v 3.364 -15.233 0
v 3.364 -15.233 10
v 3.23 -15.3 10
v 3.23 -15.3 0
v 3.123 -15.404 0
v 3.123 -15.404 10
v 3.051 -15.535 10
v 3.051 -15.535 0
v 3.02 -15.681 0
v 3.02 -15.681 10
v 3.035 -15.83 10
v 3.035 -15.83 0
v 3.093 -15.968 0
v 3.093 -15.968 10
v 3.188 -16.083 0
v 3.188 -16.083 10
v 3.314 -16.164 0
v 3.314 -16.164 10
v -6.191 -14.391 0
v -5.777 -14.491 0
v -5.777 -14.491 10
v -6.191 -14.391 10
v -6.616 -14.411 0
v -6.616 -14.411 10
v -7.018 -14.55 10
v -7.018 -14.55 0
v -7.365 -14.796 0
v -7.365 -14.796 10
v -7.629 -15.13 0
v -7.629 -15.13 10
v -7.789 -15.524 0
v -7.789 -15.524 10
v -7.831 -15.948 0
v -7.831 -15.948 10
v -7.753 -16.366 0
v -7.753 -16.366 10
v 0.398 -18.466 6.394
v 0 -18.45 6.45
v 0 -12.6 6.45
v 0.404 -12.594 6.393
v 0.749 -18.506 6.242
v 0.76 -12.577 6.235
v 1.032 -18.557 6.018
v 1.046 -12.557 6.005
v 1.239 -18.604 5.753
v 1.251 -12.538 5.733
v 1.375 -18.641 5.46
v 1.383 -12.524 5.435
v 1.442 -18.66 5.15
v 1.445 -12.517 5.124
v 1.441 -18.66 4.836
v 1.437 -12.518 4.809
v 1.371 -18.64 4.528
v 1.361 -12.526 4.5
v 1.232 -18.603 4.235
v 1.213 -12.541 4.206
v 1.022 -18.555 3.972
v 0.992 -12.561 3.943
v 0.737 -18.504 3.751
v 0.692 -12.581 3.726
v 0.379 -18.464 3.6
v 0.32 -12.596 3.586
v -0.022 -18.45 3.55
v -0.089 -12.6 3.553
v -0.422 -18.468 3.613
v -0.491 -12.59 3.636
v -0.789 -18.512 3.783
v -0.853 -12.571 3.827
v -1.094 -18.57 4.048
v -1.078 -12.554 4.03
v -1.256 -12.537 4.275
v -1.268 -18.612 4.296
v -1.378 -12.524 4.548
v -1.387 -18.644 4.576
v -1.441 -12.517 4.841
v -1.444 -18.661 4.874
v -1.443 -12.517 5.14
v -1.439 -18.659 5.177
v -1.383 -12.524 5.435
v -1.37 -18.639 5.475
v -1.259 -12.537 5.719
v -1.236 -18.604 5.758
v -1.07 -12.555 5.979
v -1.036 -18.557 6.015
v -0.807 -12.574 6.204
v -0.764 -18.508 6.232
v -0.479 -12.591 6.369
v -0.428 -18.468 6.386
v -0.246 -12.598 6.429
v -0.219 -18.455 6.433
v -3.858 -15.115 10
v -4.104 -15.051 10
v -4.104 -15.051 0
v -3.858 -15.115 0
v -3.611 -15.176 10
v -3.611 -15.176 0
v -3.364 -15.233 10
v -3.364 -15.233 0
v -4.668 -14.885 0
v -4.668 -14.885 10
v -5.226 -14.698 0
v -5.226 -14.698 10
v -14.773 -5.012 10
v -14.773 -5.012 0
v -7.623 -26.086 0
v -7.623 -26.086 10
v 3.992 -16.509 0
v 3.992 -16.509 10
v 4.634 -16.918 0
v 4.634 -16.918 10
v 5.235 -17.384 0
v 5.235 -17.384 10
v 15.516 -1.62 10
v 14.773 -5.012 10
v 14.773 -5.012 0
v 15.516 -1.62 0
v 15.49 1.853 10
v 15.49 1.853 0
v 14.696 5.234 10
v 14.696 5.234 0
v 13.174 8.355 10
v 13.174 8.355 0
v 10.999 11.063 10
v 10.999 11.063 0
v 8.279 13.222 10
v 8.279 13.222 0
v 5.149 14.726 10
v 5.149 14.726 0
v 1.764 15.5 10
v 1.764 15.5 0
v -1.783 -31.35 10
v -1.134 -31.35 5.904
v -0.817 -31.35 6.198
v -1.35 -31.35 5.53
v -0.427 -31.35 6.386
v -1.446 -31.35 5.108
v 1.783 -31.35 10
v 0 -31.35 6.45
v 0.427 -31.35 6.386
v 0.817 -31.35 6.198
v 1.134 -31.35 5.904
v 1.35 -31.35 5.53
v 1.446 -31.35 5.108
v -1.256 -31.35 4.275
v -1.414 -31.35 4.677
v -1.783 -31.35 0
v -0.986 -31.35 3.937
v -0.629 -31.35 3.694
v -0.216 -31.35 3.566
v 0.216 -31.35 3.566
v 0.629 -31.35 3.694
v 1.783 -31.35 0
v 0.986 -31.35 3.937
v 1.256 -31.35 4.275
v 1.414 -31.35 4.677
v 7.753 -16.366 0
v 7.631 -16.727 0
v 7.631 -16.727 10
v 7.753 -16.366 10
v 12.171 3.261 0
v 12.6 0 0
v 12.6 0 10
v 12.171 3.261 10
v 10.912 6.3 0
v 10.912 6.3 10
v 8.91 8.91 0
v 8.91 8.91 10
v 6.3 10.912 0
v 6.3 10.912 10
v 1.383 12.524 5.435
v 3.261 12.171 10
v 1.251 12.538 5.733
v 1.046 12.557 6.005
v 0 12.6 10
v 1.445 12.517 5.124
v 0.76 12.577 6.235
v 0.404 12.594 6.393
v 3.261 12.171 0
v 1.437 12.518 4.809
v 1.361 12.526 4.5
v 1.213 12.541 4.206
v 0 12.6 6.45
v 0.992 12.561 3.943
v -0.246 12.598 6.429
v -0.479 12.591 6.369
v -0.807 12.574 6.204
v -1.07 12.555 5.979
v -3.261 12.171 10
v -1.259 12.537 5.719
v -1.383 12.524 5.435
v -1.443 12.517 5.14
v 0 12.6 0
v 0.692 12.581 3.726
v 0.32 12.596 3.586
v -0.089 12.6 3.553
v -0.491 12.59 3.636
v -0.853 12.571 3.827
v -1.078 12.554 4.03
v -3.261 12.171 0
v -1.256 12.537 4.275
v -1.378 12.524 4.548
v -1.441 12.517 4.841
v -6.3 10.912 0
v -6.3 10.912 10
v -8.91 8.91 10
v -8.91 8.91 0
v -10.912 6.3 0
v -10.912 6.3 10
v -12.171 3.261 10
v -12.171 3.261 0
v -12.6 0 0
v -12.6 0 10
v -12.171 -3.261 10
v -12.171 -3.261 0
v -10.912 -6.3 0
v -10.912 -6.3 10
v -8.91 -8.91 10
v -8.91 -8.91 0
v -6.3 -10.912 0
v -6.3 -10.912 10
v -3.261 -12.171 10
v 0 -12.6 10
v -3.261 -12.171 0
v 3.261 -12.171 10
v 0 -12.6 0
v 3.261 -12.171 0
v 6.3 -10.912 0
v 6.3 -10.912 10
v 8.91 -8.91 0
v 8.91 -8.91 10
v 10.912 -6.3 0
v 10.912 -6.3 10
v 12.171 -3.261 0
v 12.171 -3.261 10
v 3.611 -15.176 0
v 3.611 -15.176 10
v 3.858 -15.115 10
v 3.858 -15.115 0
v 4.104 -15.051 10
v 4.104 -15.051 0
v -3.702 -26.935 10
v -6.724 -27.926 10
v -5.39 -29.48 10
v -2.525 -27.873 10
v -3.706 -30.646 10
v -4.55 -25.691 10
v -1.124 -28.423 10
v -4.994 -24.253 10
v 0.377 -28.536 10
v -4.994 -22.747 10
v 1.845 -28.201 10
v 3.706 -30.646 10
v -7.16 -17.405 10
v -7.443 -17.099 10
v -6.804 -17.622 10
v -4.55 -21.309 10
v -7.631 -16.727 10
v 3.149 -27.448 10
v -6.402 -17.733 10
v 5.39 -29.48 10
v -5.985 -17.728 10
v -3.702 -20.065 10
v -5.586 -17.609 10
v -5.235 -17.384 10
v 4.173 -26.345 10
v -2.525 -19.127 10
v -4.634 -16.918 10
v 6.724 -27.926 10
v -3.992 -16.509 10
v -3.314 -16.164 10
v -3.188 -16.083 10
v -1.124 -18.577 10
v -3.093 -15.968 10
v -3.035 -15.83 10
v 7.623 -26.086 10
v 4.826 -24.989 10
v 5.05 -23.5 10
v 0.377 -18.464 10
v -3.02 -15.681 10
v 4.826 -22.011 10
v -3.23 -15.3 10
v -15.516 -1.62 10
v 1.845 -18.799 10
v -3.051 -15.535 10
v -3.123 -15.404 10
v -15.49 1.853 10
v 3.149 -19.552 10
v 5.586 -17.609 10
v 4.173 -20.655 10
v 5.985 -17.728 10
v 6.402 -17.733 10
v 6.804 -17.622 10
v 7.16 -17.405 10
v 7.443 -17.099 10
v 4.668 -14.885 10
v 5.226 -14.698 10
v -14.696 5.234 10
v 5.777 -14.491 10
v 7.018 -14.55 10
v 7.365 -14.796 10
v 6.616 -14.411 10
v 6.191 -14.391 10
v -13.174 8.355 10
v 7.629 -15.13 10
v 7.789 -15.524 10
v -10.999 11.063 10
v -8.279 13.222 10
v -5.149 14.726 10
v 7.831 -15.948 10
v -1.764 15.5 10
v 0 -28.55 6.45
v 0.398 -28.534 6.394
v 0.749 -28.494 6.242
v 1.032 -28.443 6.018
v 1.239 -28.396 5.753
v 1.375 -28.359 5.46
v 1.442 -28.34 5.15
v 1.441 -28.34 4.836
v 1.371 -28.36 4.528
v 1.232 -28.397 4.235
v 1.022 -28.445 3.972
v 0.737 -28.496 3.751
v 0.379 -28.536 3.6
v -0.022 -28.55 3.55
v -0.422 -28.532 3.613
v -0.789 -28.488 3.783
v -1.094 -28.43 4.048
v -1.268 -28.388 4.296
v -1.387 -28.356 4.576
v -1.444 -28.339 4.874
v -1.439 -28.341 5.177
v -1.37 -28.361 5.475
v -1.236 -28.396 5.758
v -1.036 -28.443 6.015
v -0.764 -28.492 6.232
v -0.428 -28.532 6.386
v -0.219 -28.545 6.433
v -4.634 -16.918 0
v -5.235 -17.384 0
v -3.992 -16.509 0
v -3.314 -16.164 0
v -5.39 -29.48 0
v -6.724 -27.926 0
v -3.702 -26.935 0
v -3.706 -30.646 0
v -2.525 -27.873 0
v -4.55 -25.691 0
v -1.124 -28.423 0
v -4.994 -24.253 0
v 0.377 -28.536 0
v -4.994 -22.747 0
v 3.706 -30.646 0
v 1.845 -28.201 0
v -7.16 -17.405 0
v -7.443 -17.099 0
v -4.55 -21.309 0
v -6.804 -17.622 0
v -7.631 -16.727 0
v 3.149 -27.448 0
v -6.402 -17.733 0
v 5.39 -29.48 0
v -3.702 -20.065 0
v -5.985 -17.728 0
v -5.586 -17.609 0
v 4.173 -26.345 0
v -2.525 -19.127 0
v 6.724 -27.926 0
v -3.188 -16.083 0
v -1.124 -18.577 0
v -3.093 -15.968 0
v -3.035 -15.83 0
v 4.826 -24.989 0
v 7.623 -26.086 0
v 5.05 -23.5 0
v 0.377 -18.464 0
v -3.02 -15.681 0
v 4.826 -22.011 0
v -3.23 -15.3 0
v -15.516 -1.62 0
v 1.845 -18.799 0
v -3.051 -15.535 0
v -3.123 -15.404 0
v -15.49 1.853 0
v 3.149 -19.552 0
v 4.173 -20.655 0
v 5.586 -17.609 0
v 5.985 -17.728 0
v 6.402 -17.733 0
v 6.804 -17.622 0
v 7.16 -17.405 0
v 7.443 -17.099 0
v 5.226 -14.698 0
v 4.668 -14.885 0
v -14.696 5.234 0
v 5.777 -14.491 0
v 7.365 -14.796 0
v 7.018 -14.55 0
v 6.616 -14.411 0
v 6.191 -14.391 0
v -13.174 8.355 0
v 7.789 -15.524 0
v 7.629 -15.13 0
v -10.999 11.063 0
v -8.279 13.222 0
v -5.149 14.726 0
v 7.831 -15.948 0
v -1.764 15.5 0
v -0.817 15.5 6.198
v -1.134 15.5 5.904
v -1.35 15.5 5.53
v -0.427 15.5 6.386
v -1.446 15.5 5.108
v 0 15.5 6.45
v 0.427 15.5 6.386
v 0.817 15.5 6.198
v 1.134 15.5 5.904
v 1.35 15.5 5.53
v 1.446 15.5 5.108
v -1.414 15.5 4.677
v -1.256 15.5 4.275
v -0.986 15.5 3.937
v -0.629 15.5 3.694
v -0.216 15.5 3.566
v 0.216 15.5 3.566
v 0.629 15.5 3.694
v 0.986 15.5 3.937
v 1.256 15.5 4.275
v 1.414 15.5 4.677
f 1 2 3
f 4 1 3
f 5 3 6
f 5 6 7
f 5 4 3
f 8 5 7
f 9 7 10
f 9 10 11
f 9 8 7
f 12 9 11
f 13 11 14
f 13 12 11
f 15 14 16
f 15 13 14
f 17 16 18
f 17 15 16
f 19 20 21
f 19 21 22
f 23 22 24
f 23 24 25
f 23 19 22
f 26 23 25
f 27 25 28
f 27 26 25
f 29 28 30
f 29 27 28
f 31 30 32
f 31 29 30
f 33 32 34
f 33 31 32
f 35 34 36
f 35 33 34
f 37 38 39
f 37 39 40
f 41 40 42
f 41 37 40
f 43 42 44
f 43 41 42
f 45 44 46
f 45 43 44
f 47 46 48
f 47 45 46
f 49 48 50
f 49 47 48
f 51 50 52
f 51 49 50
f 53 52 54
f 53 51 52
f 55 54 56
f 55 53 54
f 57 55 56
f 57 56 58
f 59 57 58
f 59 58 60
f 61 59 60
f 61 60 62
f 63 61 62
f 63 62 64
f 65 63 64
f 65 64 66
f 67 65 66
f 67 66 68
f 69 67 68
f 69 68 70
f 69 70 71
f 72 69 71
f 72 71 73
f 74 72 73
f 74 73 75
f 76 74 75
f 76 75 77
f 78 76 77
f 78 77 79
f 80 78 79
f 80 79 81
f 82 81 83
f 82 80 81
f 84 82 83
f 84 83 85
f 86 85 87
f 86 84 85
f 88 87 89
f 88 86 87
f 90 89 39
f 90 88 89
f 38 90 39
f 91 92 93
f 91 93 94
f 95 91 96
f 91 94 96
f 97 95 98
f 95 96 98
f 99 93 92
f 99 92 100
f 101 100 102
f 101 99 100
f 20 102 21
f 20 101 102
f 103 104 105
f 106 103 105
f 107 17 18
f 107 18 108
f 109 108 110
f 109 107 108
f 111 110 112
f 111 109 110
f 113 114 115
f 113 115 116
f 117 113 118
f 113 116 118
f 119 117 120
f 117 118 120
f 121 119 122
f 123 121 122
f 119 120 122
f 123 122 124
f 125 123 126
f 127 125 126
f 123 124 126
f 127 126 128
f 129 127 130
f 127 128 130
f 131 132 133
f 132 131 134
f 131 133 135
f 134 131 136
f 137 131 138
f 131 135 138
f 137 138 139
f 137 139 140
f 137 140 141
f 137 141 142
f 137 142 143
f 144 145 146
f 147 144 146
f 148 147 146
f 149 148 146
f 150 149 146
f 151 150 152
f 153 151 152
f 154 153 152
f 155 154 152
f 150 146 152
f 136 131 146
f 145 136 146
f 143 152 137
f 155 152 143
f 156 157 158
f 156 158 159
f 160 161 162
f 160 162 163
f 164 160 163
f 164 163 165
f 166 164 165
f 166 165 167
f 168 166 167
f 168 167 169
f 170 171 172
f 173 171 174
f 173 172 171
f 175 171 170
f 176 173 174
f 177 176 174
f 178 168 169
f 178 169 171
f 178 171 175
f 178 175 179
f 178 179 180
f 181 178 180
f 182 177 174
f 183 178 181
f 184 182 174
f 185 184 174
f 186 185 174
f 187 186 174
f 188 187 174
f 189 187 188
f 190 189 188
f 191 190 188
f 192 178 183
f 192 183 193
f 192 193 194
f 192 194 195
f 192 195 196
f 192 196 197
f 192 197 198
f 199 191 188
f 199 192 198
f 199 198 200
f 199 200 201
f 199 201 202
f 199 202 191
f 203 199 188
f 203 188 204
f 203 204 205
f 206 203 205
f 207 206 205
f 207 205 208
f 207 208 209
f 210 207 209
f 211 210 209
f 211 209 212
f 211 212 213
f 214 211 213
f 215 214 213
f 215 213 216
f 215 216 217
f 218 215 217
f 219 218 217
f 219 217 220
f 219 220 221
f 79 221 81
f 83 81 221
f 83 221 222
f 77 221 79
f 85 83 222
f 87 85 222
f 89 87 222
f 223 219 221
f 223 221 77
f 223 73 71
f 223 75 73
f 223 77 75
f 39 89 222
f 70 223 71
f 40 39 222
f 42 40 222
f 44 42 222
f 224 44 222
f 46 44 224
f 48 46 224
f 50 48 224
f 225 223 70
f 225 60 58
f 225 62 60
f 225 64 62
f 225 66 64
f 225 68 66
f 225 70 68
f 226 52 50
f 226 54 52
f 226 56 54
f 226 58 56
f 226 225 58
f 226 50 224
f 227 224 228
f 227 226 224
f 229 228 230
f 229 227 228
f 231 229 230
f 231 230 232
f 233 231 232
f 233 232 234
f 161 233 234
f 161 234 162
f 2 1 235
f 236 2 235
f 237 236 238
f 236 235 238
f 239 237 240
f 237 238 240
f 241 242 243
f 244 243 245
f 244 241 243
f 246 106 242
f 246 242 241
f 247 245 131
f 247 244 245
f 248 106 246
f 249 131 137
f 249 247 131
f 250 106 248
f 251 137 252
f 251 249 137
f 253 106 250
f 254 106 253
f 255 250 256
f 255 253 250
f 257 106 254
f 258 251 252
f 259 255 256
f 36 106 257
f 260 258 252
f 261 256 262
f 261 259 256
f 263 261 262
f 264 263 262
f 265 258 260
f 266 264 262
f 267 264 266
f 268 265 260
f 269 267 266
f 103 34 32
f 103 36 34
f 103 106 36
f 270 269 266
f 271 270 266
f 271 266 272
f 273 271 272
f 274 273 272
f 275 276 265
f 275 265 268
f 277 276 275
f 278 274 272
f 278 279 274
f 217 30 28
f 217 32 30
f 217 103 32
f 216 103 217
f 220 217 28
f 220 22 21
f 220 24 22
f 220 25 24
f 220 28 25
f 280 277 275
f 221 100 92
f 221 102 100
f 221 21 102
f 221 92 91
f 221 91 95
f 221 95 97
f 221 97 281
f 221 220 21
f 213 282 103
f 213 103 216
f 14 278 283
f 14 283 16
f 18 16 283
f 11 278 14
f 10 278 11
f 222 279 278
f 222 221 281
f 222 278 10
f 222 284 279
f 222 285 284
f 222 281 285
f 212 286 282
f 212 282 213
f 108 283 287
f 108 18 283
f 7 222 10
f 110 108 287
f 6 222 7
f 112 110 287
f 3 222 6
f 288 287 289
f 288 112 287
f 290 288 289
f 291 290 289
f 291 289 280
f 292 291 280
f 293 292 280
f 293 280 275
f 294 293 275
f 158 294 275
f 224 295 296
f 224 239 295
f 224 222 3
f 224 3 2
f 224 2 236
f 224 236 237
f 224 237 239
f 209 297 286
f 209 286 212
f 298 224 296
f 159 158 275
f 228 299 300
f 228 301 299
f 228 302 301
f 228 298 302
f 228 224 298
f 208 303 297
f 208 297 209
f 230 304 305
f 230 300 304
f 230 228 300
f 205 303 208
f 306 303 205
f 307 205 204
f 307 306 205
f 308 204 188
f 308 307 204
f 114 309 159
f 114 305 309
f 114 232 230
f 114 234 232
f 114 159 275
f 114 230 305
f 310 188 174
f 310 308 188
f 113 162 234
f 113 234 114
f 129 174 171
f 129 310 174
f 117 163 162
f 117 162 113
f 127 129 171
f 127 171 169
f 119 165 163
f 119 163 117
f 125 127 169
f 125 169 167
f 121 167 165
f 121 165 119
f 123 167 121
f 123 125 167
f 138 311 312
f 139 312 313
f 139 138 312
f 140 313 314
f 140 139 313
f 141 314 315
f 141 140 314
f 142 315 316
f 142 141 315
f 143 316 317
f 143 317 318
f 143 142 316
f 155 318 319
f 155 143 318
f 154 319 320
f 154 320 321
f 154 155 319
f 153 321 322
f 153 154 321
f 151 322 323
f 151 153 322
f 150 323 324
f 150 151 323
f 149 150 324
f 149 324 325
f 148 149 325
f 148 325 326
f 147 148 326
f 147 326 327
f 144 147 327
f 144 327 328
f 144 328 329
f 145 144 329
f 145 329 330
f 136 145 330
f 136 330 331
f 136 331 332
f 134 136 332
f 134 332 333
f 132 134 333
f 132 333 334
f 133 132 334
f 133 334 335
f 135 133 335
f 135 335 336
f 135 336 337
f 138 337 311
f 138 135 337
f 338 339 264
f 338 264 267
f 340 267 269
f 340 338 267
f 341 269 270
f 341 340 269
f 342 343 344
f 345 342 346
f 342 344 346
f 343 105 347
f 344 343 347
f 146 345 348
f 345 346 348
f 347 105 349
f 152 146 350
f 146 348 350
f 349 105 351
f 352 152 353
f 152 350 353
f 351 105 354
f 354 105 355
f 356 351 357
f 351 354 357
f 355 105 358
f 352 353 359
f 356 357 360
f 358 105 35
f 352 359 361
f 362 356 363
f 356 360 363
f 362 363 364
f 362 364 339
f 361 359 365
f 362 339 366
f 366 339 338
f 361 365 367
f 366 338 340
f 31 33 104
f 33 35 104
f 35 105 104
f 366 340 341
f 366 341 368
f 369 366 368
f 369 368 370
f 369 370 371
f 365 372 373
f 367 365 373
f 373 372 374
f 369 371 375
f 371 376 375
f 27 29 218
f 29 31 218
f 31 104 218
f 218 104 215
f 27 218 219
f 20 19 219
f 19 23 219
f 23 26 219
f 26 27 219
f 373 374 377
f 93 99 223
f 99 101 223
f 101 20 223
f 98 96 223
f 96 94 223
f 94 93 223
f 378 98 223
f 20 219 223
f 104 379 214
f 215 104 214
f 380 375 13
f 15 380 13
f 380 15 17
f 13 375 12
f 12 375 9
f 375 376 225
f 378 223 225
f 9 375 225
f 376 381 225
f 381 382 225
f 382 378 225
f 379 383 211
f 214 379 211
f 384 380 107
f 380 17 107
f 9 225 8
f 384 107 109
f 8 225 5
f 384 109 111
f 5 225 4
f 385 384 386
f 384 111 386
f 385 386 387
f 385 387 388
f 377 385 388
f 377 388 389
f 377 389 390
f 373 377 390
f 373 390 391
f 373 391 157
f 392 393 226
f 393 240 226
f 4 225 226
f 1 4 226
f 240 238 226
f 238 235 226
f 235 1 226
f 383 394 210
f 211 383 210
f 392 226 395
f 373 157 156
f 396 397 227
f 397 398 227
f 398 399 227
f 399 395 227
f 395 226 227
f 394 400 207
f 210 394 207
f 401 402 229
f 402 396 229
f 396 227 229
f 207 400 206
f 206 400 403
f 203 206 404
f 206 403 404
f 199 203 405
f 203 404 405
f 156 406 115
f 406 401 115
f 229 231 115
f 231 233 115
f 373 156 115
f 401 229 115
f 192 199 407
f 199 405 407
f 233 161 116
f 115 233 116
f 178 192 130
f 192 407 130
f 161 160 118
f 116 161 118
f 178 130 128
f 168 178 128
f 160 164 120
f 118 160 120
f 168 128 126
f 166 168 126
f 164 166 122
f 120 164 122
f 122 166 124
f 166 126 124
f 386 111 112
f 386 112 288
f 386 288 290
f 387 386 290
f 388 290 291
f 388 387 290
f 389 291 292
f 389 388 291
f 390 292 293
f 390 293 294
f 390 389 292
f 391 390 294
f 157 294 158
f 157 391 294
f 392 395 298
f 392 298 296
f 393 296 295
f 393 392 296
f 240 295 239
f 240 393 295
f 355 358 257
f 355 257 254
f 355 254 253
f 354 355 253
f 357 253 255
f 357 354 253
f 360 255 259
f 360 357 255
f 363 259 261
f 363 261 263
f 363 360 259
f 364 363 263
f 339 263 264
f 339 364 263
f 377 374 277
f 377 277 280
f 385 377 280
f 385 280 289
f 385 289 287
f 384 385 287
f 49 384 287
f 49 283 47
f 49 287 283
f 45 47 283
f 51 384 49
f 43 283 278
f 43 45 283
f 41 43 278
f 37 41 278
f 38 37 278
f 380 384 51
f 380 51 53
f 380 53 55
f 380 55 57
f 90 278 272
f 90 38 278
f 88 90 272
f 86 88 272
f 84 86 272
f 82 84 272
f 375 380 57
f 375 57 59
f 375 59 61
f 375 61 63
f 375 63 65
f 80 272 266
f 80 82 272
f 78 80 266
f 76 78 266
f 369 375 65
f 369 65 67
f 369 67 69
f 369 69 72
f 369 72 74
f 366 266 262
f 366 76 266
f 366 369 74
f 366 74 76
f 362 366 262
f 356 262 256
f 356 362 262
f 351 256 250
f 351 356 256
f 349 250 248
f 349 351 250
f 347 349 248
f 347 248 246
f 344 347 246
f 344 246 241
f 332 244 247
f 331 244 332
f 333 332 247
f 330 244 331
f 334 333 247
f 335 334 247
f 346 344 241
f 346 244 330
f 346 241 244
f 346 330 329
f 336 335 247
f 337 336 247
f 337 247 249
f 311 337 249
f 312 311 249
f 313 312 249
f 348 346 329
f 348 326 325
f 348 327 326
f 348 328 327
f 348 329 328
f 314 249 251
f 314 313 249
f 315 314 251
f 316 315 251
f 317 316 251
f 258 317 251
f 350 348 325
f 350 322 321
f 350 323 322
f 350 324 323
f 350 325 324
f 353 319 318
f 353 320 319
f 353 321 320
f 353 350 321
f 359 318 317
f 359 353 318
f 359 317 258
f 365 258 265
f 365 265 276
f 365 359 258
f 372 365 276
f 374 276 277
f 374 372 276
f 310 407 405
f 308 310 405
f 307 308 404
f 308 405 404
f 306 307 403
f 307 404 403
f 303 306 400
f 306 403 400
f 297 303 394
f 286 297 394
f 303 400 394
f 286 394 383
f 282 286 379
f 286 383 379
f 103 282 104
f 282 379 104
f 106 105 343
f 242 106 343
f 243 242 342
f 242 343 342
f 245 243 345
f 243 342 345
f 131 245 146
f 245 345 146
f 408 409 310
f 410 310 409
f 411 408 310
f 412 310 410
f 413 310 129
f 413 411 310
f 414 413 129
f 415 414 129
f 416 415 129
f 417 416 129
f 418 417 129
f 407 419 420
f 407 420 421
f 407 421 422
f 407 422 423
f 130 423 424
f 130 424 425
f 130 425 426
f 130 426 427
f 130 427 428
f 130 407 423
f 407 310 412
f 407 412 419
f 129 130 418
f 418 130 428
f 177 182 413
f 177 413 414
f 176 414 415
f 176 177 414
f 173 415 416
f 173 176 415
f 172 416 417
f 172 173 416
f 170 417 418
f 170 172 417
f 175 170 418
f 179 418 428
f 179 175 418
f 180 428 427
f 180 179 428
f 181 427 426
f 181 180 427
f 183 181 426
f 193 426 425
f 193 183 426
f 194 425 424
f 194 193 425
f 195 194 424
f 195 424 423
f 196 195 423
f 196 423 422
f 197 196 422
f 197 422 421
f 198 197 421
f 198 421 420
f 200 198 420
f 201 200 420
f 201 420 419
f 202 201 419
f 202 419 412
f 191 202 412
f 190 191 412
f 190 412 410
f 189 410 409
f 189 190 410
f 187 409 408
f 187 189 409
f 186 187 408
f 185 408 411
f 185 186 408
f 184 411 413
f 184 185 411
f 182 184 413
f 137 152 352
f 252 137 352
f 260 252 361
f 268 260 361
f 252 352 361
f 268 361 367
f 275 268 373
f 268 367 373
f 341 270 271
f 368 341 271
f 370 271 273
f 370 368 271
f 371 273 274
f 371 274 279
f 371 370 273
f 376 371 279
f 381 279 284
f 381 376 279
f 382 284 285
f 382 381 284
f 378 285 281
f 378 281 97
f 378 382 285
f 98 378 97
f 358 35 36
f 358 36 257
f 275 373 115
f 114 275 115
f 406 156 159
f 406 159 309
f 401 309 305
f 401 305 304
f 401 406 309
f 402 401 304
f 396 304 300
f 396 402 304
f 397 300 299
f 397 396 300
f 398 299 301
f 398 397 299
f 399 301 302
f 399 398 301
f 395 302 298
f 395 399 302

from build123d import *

# Parameters (mm, degrees)
SKETCH_1_R               = 12.6
SKETCH_1_R_2             = 5.05
EXTRUDE_1_DEPTH          = 10
EXTRUDE_START            = -10
EXTRUDE_2_DEPTH          = 10
CUT_EXTRUDE_1_DEPTH      = 37.589103569
CUT_EXTRUDE_1_DEPTH_BACK = 37.589103569
SKETCH_3_R               = 1.45
CUT_EXTRUDE_2_DEPTH      = 37.589103725
CUT_EXTRUDE_2_DEPTH_BACK = 37.589103725
SKETCH_4_W               = 93.892826014
SKETCH_4_H               = 80.433232648
SKETCH_4_W_2             = 43.077359666
SKETCH_4_H_2             = 46.85


with BuildPart() as part:
    # 草图1 → 凸台-拉伸1 (new body)
    with BuildSketch(Plane.XY):
        with BuildLine():
            Line((-1.414911685, -15.535701623), (-1.414911685, -15.575321778))
            ThreePointArc((-1.414911685, -15.575321778), (0.005842023, -31.54999788), (1.403408047, -15.573276474))
            Line((1.403408047, -15.573276474), (1.403408047, -15.536745021))
            ThreePointArc((1.403408047, -15.536745021), (0.00577543, 15.599998931), (-1.414911685, -15.535701623))
        make_face()
        Circle(SKETCH_1_R, mode=Mode.SUBTRACT)
        with Locations((0, -23.5)):
            Circle(SKETCH_1_R_2, mode=Mode.SUBTRACT)
    extrude(amount=EXTRUDE_1_DEPTH)

    # 草图2 → 凸台-拉伸2 (add)
    with BuildSketch(Plane.XY.offset(10).offset(EXTRUDE_START)):
        Polygon((-14.77297225, -5.011914894), (-7.623232475, -26.086276596), (-5.929048094, -20.254331983), (0, -17.39919484), (5.929048094, -20.254331983), (7.623232475, -26.086276596), (14.77297225, -5.011914894), (5.311228847, -13.252346959), (0, -13.517472928), (-5.311228847, -13.252346959), align=None)
        with BuildLine():
            Line((-7.752949676, -16.366177664), (-7.630606655, -16.726792335))
            ThreePointArc((-7.630606655, -16.726792335), (-6.60716899, -17.691376281), (-5.234715693, -17.384425487))
            ThreePointArc((-5.234715693, -17.384425487), (-4.31764561, -16.705852785), (-3.31386093, -16.163732166))
            ThreePointArc((-3.31386093, -16.163732166), (-3.025346815, -15.633069871), (-3.458264207, -15.211850929))
            Line((-3.458264207, -15.211850929), (-4.103625329, -15.050589994))
            ThreePointArc((-4.103625329, -15.050589994), (-4.948227887, -14.794426004), (-5.776991612, -14.490906387))
            ThreePointArc((-5.776991612, -14.490906387), (-7.36504895, -14.796244404), (-7.752949676, -16.366177664))
        make_face(mode=Mode.SUBTRACT)
        with BuildLine():
            Line((4.103625329, -15.050589994), (3.458264207, -15.211850929))
            ThreePointArc((3.458264207, -15.211850929), (3.025346815, -15.633069871), (3.31386093, -16.163732166))
            ThreePointArc((3.31386093, -16.163732166), (4.31764561, -16.705852785), (5.234715693, -17.384425487))
            ThreePointArc((5.234715693, -17.384425487), (6.60716899, -17.691376281), (7.630606655, -16.726792335))
            Line((7.630606655, -16.726792335), (7.752949676, -16.366177664))
            ThreePointArc((7.752949676, -16.366177664), (7.36504895, -14.796244404), (5.776991612, -14.490906387))
            ThreePointArc((5.776991612, -14.490906387), (4.948227887, -14.794426004), (4.103625329, -15.050589994))
        make_face(mode=Mode.SUBTRACT)
    extrude(amount=EXTRUDE_2_DEPTH)

    # 草图3 → 切除-拉伸1 (cut, two sides: drawn at the far end of the back side and taken through both)
    with BuildSketch(Plane(origin=(0, 0, 0), x_dir=(1, 0, 0), z_dir=(0, 1, 0)).offset(-CUT_EXTRUDE_1_DEPTH_BACK)):
        with Locations(Location((0, -5, 0), (0, 0, 270))):
            Circle(SKETCH_3_R)
    extrude(amount=CUT_EXTRUDE_1_DEPTH + CUT_EXTRUDE_1_DEPTH_BACK, mode=Mode.SUBTRACT)

    # 草图4 → 切除-拉伸2 (cut, two sides: drawn at the far end of the back side and taken through both)
    with BuildSketch(Plane.XY.offset(10).offset(-CUT_EXTRUDE_2_DEPTH_BACK)):
        with Locations((-5.954078533, 0.891401237)):
            Rectangle(SKETCH_4_W, SKETCH_4_H)
        with Locations((3.186246386, -7.925)):
            Rectangle(SKETCH_4_W_2, SKETCH_4_H_2, mode=Mode.SUBTRACT)
    extrude(amount=CUT_EXTRUDE_2_DEPTH + CUT_EXTRUDE_2_DEPTH_BACK, mode=Mode.SUBTRACT)


solid = part.part
